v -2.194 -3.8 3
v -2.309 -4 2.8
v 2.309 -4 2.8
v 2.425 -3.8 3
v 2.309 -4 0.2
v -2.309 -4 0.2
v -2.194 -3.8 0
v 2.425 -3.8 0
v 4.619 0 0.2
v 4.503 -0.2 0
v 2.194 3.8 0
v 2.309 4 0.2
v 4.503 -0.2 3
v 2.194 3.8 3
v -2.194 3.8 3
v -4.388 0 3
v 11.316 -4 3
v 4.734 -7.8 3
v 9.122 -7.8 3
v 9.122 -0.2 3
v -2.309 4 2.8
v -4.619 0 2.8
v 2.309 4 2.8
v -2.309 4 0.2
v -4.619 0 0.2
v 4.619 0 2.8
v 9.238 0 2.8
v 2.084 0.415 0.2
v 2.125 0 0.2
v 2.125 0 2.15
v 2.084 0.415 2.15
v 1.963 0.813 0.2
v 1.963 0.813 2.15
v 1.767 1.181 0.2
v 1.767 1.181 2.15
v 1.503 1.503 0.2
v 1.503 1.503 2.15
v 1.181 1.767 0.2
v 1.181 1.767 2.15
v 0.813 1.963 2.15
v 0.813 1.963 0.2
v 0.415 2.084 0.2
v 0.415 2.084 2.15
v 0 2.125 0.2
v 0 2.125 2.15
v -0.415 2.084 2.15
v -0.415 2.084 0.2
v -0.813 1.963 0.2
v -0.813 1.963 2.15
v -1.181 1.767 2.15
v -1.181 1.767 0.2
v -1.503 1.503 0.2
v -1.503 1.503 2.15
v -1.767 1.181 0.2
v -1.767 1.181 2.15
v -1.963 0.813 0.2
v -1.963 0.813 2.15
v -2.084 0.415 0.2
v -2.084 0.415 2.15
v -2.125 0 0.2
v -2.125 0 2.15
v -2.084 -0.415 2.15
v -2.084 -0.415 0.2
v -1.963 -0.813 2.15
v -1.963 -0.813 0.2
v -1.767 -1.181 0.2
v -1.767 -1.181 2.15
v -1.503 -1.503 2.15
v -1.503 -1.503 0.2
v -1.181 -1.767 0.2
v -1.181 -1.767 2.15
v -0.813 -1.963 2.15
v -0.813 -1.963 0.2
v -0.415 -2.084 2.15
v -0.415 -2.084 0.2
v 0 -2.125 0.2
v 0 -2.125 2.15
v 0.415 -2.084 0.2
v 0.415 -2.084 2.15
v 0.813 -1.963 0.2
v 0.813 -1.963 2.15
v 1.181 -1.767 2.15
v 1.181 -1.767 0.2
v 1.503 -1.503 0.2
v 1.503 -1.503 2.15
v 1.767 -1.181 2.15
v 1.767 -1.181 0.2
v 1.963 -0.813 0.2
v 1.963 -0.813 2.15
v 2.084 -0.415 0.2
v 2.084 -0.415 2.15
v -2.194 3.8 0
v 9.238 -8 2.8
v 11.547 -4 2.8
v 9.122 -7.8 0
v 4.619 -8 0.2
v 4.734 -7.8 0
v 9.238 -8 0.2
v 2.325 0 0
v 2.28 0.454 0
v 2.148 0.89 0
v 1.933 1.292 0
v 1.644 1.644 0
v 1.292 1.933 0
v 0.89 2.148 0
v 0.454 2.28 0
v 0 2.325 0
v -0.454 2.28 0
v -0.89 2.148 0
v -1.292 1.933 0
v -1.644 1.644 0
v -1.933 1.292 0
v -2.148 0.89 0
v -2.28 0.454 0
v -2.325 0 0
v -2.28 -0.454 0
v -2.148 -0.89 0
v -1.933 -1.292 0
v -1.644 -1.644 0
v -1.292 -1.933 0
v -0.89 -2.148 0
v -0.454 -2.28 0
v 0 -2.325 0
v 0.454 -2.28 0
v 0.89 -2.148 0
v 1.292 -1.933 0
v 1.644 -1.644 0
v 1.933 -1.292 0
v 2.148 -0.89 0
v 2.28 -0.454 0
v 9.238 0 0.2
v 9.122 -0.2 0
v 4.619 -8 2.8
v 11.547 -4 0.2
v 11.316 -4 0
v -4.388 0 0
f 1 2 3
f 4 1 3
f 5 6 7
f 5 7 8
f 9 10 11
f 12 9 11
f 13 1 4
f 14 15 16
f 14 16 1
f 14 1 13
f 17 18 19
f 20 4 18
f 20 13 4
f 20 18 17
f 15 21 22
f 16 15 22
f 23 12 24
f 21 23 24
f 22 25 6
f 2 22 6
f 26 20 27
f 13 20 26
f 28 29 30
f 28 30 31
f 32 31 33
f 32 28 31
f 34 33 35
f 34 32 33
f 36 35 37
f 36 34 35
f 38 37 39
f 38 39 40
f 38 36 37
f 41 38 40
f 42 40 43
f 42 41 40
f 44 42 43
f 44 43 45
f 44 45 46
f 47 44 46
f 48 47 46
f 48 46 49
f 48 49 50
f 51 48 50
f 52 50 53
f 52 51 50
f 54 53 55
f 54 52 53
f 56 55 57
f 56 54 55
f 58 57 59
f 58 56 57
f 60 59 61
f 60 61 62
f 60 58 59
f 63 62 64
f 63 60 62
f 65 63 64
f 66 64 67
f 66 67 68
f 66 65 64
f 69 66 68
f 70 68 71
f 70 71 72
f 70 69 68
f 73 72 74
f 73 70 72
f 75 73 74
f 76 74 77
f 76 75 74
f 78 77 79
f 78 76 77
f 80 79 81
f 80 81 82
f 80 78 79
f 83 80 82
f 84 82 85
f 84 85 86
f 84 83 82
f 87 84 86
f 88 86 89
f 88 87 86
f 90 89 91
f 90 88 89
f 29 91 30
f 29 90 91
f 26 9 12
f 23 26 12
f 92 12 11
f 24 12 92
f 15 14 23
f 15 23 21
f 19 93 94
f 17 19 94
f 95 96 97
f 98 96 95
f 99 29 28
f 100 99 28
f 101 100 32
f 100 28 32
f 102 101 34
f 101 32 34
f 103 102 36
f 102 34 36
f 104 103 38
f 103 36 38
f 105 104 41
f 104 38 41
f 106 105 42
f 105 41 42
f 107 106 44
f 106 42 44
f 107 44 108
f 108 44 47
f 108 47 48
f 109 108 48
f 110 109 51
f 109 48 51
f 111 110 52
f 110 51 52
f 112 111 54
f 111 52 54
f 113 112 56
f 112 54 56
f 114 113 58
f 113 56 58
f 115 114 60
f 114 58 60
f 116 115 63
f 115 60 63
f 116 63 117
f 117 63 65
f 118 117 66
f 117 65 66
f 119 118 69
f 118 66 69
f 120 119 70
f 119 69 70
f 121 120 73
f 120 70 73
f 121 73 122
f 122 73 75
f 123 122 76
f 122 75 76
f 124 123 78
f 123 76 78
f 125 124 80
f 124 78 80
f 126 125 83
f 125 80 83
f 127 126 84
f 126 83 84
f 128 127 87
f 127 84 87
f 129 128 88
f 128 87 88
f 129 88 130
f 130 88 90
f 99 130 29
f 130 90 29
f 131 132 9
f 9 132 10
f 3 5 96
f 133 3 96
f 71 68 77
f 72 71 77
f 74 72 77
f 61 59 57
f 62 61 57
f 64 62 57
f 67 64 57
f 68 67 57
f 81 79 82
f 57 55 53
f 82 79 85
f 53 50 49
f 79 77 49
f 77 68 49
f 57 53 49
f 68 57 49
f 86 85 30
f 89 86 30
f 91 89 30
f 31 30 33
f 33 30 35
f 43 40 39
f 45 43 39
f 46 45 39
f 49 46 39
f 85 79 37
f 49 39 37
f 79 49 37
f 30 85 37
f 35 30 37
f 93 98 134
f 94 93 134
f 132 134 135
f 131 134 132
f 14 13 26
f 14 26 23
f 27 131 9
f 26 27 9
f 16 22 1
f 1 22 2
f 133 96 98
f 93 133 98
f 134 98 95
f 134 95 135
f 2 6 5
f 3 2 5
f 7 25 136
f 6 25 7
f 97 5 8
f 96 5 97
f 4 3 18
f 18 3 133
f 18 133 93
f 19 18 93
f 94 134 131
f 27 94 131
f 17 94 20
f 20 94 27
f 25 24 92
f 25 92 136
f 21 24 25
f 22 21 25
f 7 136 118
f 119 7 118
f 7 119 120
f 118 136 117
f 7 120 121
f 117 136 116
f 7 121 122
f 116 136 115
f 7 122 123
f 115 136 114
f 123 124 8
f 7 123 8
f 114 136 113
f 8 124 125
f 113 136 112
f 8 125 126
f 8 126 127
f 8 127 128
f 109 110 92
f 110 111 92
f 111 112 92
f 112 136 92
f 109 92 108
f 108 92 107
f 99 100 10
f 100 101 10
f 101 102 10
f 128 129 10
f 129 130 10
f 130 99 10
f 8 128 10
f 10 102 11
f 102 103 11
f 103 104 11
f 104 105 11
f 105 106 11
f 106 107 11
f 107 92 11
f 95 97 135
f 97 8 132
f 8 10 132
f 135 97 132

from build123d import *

# Parameters (mm, degrees)
PAD_DEPTH       = 3
SKETCH001_R     = 2.125
POCKET_DEPTH    = 2.15
CHAMFER_SIZE    = 0.2
CHAMFER001_SIZE = 0.2


with BuildPart() as part:
    # Sketch → Pad (new body)
    with BuildSketch(Plane.XY):
        Polygon((4.618802, 0), (2.309401, 4), (-2.309401, 4), (-4.618802, 0), (-2.309401, -4), (2.309401, -4), (4.618802, -8), (9.237604, -8), (11.547005, -4), (9.237604, 0), align=None)
    extrude(amount=PAD_DEPTH)

    # Sketch001 → Pocket (cut)
    with BuildSketch(Plane.XY):
        Circle(SKETCH001_R)
    extrude(amount=POCKET_DEPTH, mode=Mode.SUBTRACT)

    # Chamfer
    chamfer_edges = [part.edges().sort_by_distance(p)[0] for p in [
        (3.464102, 2, 3),
        (0, 4, 3),
        (-3.464102, 2, 3),
        (-3.464102, -2, 3),
        (0, -4, 3),
        (3.464102, -6, 3),
        (6.928203, -8, 3),
        (10.392305, -6, 3),
        (10.392305, -2, 3),
        (6.928203, 0, 3),
    ]]
    chamfer(chamfer_edges, length=CHAMFER_SIZE)

    # Chamfer001
    chamfer001_edges = [part.edges().sort_by_distance(p)[0] for p in [
        (3.464102, 2, 0),
        (6.928203, 0, 0),
        (0, 4, 0),
        (10.392305, -2, 0),
        (-3.464102, 2, 0),
        (10.392305, -6, 0),
        (-3.464102, -2, 0),
        (6.928203, -8, 0),
        (0, -4, 0),
        (3.464102, -6, 0),
        (-2.125, 0, 0),
    ]]
    chamfer(chamfer001_edges, length=CHAMFER001_SIZE)


solid = part.part
